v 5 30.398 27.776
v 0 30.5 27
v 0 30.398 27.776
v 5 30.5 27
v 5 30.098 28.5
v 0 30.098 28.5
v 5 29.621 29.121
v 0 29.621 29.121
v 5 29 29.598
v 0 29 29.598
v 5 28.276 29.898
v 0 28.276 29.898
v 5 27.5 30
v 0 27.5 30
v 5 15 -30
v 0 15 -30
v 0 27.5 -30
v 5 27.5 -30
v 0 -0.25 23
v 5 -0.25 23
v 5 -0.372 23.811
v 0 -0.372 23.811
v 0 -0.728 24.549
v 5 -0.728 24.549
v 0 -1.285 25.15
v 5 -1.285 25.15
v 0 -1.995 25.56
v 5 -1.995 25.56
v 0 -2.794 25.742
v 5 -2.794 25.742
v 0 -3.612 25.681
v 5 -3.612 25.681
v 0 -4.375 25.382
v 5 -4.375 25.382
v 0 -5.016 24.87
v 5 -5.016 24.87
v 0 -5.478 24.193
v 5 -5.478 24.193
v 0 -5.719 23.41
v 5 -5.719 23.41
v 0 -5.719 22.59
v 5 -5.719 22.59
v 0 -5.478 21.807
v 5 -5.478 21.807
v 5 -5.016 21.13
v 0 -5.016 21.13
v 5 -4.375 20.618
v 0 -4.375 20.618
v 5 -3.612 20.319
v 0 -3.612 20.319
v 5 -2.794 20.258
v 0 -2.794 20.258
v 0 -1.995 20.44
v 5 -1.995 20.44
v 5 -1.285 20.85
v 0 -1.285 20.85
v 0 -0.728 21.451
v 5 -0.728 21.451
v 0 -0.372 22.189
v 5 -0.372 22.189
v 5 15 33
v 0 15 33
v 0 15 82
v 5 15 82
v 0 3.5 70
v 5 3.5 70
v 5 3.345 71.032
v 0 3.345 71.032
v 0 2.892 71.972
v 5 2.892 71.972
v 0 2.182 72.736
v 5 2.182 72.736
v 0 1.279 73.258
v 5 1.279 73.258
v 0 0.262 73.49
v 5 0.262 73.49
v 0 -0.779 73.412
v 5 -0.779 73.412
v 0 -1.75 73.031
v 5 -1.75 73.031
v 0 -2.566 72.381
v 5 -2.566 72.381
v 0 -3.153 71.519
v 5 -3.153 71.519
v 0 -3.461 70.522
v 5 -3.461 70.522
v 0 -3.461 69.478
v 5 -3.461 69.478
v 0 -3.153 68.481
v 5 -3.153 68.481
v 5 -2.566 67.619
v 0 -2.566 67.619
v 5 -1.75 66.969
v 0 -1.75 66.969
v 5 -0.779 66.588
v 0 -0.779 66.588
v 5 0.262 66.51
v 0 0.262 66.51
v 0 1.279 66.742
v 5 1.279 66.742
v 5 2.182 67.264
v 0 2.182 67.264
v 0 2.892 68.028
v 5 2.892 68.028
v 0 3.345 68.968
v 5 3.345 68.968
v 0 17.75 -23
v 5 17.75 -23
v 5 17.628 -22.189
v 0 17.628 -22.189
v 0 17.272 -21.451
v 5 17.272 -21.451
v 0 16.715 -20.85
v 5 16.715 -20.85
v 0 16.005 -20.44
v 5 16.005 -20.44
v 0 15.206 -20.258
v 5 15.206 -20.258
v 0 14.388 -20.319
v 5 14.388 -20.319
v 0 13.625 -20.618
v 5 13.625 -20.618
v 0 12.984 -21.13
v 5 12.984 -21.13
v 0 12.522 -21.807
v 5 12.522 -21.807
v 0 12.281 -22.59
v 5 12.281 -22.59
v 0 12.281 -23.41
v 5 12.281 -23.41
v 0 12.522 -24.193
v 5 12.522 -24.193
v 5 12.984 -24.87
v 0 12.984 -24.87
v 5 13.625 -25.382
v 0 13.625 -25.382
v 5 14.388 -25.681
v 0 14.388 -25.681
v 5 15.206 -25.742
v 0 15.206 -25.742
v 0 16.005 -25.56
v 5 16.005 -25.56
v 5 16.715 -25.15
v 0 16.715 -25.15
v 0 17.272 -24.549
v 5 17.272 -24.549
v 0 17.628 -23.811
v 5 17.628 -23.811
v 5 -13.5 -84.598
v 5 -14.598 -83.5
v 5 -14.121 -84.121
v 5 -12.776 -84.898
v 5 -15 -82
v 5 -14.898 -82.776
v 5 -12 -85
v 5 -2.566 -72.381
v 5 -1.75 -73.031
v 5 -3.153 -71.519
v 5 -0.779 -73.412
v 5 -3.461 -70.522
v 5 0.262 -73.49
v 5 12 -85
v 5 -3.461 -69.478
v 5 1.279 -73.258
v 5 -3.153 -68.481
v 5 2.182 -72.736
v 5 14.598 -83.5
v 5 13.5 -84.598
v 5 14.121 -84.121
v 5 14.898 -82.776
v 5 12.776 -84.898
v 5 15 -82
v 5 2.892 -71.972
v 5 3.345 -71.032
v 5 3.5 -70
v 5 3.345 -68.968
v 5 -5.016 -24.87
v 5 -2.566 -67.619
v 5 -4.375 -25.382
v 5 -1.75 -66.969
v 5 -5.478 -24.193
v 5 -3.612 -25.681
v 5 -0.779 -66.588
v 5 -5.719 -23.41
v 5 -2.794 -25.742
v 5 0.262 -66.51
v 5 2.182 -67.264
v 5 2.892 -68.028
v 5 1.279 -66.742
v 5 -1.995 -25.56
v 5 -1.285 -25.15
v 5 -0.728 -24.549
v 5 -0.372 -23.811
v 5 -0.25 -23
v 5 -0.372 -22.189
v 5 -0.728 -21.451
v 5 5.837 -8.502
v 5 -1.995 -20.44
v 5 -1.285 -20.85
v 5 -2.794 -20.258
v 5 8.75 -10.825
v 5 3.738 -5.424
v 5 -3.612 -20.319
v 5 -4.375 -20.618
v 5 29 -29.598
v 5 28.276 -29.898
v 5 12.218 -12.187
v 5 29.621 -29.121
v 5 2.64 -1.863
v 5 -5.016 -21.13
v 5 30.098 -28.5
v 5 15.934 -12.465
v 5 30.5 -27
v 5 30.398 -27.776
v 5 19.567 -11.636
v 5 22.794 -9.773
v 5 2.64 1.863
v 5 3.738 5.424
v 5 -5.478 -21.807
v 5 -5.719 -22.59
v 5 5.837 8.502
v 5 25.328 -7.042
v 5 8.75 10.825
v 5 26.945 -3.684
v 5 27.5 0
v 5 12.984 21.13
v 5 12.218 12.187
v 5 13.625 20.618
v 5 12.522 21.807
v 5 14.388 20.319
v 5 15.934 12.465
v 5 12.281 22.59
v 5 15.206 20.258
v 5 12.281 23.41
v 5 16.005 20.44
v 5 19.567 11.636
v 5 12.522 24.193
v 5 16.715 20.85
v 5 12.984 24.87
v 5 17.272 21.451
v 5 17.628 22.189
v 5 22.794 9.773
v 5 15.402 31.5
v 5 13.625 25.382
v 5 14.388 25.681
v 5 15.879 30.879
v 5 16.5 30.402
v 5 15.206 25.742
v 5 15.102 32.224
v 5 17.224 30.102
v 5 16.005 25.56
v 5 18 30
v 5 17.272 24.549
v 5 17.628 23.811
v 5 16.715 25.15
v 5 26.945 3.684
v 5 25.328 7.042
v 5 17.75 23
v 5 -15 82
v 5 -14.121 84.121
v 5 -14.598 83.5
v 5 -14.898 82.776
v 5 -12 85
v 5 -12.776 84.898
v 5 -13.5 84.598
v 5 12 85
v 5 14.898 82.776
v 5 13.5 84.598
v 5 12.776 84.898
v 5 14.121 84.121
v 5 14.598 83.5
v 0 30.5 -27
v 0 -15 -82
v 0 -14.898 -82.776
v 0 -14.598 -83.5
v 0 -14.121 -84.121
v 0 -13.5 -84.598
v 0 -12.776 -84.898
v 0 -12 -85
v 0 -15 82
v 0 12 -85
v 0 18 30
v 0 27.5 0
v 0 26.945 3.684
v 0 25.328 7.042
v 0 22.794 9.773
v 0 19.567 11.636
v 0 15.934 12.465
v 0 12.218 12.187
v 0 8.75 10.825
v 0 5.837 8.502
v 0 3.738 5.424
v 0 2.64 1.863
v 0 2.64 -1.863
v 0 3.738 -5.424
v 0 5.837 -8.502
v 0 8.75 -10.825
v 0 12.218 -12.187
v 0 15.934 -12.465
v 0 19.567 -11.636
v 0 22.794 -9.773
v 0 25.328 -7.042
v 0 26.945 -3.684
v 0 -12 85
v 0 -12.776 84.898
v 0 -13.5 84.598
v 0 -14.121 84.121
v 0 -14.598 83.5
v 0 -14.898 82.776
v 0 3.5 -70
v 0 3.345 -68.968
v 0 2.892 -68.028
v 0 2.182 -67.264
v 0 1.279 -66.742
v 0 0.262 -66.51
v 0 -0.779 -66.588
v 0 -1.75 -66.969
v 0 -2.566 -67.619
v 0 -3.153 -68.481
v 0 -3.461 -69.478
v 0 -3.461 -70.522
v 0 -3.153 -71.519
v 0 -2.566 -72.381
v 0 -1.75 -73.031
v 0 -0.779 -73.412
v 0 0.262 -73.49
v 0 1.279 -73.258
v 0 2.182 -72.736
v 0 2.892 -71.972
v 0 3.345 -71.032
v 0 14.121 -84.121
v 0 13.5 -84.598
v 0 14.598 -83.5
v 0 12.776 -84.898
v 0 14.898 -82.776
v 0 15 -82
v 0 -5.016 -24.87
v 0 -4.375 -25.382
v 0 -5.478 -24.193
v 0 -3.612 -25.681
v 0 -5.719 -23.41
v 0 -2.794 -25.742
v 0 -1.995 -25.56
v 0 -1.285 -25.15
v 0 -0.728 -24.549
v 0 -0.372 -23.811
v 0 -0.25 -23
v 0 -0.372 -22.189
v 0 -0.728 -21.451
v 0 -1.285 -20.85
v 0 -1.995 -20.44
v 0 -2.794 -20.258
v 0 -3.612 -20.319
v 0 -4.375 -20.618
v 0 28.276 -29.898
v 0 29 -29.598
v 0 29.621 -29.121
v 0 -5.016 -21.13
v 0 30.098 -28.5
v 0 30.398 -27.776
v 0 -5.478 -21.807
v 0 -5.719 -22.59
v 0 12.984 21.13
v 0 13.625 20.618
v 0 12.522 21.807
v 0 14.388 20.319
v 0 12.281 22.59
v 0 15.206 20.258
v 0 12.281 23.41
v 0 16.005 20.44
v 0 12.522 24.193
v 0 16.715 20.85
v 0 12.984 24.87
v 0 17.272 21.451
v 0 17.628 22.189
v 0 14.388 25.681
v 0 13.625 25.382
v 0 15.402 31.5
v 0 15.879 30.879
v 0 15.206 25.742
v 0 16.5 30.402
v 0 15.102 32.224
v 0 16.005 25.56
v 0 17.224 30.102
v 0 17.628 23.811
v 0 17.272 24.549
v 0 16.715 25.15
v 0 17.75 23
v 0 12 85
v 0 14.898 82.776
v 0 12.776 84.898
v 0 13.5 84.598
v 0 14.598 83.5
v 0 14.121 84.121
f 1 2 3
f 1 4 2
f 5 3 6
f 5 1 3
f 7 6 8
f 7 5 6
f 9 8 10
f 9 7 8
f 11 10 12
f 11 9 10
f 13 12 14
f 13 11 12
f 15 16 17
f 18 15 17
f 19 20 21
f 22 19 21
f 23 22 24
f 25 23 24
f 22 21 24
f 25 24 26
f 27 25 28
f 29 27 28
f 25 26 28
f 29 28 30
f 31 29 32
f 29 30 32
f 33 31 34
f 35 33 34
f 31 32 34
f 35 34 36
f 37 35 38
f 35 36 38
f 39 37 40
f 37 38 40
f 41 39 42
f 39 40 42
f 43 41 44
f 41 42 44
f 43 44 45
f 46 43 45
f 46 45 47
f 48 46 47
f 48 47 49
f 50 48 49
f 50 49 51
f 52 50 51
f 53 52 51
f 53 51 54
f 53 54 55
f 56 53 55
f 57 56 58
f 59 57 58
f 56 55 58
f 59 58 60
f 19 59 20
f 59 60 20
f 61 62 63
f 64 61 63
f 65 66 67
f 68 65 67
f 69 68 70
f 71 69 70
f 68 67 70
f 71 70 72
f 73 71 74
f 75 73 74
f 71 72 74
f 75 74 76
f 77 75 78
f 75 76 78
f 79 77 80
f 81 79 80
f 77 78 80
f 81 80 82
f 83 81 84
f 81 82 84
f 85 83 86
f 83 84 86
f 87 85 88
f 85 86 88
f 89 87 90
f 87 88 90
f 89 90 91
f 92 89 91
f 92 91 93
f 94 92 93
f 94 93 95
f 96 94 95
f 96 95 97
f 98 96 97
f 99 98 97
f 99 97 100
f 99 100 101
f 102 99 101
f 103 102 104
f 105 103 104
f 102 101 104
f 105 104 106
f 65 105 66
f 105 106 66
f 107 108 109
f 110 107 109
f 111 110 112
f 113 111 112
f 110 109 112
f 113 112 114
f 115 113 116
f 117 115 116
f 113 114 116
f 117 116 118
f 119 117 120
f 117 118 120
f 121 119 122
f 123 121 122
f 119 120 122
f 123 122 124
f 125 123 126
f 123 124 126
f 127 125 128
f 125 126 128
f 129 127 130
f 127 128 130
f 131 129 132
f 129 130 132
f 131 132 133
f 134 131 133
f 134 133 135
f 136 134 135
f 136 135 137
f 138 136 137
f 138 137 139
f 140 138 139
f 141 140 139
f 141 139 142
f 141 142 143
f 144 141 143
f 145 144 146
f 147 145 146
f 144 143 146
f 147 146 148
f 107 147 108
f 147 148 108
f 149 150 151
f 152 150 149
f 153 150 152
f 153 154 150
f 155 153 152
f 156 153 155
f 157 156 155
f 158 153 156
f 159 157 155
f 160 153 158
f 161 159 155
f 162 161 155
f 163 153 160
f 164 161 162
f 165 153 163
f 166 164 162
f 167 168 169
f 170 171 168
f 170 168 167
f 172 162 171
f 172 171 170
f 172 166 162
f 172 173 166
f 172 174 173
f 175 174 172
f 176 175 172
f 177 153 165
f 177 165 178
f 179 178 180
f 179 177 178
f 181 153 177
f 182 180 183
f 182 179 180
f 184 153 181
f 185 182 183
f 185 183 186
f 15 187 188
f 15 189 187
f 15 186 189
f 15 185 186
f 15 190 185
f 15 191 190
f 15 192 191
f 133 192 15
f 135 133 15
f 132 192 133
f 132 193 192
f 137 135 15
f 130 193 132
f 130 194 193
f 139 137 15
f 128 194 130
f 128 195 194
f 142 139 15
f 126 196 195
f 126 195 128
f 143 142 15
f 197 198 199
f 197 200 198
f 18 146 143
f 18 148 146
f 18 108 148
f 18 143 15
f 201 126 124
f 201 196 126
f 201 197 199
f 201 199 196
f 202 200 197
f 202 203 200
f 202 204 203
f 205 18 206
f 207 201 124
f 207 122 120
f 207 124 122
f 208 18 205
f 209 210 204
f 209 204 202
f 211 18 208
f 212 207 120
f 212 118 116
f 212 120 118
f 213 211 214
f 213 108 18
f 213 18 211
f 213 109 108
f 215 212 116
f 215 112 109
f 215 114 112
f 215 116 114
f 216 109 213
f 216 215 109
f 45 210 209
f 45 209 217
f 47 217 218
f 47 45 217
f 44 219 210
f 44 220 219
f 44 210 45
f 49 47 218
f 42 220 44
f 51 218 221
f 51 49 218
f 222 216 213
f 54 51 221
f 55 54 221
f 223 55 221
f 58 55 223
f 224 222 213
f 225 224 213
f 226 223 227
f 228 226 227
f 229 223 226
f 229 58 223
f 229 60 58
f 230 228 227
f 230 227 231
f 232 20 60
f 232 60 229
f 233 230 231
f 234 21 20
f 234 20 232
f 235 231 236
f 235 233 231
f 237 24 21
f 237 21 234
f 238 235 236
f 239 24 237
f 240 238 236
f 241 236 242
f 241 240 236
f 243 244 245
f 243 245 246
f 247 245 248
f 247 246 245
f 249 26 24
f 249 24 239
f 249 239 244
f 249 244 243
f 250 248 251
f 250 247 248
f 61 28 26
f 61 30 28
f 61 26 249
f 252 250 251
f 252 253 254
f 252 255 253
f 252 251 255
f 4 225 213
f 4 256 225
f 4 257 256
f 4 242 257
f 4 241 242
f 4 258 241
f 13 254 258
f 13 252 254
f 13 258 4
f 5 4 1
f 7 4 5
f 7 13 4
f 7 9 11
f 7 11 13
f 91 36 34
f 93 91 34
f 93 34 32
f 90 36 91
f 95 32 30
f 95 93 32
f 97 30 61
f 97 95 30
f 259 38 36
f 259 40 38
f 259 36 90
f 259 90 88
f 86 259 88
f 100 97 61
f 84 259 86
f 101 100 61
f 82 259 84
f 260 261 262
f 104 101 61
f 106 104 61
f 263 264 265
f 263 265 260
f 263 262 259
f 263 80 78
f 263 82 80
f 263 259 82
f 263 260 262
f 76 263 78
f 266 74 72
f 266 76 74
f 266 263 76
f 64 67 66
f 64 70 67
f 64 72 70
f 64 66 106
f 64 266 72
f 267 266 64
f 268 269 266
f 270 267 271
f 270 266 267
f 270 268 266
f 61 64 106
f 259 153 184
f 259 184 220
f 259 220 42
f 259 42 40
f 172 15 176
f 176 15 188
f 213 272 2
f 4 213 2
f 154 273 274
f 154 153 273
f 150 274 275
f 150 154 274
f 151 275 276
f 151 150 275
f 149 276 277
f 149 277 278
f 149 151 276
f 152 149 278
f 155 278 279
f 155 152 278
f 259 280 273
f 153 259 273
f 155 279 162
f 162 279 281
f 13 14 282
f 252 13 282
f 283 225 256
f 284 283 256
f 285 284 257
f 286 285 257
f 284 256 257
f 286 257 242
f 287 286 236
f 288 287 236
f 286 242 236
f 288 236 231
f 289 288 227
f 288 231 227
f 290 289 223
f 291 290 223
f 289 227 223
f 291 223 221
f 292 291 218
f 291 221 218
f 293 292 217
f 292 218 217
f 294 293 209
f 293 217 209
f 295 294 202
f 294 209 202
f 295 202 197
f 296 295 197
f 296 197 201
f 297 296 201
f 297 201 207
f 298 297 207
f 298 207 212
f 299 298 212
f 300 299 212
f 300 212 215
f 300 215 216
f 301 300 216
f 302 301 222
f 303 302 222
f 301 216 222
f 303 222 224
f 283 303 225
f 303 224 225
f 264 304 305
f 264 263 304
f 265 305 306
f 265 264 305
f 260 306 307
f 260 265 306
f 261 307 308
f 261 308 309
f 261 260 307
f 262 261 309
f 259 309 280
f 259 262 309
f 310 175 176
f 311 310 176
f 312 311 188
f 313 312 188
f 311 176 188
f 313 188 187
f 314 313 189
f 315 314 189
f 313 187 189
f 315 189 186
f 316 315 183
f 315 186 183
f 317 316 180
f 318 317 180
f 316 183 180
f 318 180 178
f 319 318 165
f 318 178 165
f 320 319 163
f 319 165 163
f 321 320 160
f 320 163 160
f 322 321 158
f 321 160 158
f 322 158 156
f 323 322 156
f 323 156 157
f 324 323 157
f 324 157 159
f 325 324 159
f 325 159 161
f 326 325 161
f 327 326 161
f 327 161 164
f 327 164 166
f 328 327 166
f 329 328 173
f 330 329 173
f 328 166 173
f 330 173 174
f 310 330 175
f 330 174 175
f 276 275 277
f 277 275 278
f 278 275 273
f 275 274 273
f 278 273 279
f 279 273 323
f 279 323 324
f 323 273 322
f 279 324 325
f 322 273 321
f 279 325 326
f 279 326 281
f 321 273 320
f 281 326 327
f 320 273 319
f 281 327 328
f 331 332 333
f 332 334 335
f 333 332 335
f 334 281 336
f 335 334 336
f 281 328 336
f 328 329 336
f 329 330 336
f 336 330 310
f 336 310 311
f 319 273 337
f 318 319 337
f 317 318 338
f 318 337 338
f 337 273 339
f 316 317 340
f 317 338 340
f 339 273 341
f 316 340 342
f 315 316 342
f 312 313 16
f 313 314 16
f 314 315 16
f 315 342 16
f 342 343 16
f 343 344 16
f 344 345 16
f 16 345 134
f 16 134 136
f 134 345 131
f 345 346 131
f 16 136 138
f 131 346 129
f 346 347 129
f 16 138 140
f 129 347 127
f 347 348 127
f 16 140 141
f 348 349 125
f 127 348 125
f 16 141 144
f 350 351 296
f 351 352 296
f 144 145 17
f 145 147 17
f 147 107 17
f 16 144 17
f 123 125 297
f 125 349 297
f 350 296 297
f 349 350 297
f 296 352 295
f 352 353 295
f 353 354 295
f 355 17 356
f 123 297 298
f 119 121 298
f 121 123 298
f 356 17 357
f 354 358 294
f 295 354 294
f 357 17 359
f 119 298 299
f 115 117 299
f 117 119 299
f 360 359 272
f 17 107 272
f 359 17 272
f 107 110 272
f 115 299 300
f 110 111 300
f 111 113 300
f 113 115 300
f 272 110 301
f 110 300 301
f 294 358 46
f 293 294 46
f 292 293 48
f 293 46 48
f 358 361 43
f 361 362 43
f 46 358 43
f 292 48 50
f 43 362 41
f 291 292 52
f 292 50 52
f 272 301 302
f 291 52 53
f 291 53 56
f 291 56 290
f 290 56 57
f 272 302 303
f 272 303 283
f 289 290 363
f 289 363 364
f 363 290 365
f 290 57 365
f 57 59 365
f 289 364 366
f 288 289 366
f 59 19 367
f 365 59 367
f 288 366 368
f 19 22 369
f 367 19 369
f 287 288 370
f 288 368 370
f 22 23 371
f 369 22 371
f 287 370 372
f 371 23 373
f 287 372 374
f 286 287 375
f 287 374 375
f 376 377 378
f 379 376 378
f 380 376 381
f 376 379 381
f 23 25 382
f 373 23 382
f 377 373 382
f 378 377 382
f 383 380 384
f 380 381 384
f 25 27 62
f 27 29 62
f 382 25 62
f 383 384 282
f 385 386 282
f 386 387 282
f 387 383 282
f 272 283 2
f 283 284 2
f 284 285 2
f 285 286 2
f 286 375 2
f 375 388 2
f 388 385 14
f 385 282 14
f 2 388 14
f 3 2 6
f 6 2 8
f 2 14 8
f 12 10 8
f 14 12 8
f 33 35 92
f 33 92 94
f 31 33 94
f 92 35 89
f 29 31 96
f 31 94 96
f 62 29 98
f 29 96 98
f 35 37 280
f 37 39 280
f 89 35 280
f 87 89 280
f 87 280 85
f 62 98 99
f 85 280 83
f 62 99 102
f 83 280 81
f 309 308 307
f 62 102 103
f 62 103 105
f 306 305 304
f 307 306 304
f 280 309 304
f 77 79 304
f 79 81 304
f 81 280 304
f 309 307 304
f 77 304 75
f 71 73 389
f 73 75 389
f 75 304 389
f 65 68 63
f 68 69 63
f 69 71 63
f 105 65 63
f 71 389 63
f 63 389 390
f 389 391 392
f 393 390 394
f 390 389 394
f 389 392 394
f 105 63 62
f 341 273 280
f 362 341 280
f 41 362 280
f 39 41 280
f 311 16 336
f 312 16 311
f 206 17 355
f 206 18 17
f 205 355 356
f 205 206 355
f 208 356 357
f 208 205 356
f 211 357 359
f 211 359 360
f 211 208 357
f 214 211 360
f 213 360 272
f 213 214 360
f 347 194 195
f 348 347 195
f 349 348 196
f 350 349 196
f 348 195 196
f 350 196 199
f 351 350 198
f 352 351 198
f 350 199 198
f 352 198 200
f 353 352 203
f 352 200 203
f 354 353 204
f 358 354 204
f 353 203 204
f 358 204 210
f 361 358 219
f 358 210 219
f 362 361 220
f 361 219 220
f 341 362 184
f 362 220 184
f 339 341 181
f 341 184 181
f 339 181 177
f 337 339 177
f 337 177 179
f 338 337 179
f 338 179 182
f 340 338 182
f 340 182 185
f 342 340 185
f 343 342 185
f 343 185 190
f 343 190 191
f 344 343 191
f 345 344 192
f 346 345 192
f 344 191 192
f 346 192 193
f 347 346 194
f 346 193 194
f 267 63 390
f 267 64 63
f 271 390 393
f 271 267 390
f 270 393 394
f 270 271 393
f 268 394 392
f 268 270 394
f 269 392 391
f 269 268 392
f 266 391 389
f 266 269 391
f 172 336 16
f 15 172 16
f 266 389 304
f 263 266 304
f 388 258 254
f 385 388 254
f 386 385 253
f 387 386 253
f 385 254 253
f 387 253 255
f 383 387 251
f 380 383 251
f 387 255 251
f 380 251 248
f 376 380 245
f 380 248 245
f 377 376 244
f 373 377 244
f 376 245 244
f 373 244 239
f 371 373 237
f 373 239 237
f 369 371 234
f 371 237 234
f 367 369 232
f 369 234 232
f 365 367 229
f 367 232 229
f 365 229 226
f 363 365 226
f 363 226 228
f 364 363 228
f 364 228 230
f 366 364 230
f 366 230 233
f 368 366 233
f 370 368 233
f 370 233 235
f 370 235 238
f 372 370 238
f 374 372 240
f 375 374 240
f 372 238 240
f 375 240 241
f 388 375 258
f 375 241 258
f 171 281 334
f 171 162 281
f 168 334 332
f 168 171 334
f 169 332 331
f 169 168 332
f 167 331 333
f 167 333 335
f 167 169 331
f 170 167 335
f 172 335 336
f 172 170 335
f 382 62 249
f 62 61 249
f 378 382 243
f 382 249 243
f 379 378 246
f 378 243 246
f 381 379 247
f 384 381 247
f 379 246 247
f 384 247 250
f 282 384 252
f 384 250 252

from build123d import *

# Parameters (mm, degrees)
F1_DEPTH = 5
F2_R     = 3
F3_R     = 3.5
F4_DEPTH = 5
F6_R     = 12.5
F6_R_2   = 2.75
F7_DEPTH = 5


# Not quite as in the source:
# - two fillets or chamfers of one size are made in one step


with BuildPart() as f1:
    # F0 (on Right) → F1 (new body)
    with BuildSketch(Plane.YZ):
        Polygon((15, 30), (15, 85), (-15, 85), (-15, -85), (15, -85), (15, -30), (30.5, -30), (30.5, 30), align=None)
    extrude(amount=F1_DEPTH)

    # F2
    f2_edges = [f1.edges().sort_by_distance(p)[0] for p in [
        (2.5, -15, 85),
        (2.5, 15, 85),
        (2.5, -15, -85),
        (2.5, 15, 30),
        (2.5, 15, -85),
        (2.5, 30.5, -30),
        (2.5, 30.5, 30),
    ]]
    fillet(f2_edges, radius=F2_R)

    # F3 (on face) → F4 (cut)
    with BuildSketch(Plane.YZ.offset(5)):
        with Locations((0, 70)):
            Circle(F3_R)
        with Locations((0, -70)):
            Circle(F3_R)
    extrude(amount=-F4_DEPTH, mode=Mode.SUBTRACT)

    # F6 (on face) → F7 (cut)
    with BuildSketch(Plane.YZ.offset(5)):
        with Locations((15, 0)):
            Circle(F6_R)
        with Locations((15, 23)):
            Circle(F6_R_2)
        with Locations((15, -23)):
            Circle(F6_R_2)
        with Locations((-3, -23)):
            Circle(F6_R_2)
        with Locations((-3, 23)):
            Circle(F6_R_2)
    extrude(amount=-F7_DEPTH, mode=Mode.SUBTRACT)


solid = f1.part
